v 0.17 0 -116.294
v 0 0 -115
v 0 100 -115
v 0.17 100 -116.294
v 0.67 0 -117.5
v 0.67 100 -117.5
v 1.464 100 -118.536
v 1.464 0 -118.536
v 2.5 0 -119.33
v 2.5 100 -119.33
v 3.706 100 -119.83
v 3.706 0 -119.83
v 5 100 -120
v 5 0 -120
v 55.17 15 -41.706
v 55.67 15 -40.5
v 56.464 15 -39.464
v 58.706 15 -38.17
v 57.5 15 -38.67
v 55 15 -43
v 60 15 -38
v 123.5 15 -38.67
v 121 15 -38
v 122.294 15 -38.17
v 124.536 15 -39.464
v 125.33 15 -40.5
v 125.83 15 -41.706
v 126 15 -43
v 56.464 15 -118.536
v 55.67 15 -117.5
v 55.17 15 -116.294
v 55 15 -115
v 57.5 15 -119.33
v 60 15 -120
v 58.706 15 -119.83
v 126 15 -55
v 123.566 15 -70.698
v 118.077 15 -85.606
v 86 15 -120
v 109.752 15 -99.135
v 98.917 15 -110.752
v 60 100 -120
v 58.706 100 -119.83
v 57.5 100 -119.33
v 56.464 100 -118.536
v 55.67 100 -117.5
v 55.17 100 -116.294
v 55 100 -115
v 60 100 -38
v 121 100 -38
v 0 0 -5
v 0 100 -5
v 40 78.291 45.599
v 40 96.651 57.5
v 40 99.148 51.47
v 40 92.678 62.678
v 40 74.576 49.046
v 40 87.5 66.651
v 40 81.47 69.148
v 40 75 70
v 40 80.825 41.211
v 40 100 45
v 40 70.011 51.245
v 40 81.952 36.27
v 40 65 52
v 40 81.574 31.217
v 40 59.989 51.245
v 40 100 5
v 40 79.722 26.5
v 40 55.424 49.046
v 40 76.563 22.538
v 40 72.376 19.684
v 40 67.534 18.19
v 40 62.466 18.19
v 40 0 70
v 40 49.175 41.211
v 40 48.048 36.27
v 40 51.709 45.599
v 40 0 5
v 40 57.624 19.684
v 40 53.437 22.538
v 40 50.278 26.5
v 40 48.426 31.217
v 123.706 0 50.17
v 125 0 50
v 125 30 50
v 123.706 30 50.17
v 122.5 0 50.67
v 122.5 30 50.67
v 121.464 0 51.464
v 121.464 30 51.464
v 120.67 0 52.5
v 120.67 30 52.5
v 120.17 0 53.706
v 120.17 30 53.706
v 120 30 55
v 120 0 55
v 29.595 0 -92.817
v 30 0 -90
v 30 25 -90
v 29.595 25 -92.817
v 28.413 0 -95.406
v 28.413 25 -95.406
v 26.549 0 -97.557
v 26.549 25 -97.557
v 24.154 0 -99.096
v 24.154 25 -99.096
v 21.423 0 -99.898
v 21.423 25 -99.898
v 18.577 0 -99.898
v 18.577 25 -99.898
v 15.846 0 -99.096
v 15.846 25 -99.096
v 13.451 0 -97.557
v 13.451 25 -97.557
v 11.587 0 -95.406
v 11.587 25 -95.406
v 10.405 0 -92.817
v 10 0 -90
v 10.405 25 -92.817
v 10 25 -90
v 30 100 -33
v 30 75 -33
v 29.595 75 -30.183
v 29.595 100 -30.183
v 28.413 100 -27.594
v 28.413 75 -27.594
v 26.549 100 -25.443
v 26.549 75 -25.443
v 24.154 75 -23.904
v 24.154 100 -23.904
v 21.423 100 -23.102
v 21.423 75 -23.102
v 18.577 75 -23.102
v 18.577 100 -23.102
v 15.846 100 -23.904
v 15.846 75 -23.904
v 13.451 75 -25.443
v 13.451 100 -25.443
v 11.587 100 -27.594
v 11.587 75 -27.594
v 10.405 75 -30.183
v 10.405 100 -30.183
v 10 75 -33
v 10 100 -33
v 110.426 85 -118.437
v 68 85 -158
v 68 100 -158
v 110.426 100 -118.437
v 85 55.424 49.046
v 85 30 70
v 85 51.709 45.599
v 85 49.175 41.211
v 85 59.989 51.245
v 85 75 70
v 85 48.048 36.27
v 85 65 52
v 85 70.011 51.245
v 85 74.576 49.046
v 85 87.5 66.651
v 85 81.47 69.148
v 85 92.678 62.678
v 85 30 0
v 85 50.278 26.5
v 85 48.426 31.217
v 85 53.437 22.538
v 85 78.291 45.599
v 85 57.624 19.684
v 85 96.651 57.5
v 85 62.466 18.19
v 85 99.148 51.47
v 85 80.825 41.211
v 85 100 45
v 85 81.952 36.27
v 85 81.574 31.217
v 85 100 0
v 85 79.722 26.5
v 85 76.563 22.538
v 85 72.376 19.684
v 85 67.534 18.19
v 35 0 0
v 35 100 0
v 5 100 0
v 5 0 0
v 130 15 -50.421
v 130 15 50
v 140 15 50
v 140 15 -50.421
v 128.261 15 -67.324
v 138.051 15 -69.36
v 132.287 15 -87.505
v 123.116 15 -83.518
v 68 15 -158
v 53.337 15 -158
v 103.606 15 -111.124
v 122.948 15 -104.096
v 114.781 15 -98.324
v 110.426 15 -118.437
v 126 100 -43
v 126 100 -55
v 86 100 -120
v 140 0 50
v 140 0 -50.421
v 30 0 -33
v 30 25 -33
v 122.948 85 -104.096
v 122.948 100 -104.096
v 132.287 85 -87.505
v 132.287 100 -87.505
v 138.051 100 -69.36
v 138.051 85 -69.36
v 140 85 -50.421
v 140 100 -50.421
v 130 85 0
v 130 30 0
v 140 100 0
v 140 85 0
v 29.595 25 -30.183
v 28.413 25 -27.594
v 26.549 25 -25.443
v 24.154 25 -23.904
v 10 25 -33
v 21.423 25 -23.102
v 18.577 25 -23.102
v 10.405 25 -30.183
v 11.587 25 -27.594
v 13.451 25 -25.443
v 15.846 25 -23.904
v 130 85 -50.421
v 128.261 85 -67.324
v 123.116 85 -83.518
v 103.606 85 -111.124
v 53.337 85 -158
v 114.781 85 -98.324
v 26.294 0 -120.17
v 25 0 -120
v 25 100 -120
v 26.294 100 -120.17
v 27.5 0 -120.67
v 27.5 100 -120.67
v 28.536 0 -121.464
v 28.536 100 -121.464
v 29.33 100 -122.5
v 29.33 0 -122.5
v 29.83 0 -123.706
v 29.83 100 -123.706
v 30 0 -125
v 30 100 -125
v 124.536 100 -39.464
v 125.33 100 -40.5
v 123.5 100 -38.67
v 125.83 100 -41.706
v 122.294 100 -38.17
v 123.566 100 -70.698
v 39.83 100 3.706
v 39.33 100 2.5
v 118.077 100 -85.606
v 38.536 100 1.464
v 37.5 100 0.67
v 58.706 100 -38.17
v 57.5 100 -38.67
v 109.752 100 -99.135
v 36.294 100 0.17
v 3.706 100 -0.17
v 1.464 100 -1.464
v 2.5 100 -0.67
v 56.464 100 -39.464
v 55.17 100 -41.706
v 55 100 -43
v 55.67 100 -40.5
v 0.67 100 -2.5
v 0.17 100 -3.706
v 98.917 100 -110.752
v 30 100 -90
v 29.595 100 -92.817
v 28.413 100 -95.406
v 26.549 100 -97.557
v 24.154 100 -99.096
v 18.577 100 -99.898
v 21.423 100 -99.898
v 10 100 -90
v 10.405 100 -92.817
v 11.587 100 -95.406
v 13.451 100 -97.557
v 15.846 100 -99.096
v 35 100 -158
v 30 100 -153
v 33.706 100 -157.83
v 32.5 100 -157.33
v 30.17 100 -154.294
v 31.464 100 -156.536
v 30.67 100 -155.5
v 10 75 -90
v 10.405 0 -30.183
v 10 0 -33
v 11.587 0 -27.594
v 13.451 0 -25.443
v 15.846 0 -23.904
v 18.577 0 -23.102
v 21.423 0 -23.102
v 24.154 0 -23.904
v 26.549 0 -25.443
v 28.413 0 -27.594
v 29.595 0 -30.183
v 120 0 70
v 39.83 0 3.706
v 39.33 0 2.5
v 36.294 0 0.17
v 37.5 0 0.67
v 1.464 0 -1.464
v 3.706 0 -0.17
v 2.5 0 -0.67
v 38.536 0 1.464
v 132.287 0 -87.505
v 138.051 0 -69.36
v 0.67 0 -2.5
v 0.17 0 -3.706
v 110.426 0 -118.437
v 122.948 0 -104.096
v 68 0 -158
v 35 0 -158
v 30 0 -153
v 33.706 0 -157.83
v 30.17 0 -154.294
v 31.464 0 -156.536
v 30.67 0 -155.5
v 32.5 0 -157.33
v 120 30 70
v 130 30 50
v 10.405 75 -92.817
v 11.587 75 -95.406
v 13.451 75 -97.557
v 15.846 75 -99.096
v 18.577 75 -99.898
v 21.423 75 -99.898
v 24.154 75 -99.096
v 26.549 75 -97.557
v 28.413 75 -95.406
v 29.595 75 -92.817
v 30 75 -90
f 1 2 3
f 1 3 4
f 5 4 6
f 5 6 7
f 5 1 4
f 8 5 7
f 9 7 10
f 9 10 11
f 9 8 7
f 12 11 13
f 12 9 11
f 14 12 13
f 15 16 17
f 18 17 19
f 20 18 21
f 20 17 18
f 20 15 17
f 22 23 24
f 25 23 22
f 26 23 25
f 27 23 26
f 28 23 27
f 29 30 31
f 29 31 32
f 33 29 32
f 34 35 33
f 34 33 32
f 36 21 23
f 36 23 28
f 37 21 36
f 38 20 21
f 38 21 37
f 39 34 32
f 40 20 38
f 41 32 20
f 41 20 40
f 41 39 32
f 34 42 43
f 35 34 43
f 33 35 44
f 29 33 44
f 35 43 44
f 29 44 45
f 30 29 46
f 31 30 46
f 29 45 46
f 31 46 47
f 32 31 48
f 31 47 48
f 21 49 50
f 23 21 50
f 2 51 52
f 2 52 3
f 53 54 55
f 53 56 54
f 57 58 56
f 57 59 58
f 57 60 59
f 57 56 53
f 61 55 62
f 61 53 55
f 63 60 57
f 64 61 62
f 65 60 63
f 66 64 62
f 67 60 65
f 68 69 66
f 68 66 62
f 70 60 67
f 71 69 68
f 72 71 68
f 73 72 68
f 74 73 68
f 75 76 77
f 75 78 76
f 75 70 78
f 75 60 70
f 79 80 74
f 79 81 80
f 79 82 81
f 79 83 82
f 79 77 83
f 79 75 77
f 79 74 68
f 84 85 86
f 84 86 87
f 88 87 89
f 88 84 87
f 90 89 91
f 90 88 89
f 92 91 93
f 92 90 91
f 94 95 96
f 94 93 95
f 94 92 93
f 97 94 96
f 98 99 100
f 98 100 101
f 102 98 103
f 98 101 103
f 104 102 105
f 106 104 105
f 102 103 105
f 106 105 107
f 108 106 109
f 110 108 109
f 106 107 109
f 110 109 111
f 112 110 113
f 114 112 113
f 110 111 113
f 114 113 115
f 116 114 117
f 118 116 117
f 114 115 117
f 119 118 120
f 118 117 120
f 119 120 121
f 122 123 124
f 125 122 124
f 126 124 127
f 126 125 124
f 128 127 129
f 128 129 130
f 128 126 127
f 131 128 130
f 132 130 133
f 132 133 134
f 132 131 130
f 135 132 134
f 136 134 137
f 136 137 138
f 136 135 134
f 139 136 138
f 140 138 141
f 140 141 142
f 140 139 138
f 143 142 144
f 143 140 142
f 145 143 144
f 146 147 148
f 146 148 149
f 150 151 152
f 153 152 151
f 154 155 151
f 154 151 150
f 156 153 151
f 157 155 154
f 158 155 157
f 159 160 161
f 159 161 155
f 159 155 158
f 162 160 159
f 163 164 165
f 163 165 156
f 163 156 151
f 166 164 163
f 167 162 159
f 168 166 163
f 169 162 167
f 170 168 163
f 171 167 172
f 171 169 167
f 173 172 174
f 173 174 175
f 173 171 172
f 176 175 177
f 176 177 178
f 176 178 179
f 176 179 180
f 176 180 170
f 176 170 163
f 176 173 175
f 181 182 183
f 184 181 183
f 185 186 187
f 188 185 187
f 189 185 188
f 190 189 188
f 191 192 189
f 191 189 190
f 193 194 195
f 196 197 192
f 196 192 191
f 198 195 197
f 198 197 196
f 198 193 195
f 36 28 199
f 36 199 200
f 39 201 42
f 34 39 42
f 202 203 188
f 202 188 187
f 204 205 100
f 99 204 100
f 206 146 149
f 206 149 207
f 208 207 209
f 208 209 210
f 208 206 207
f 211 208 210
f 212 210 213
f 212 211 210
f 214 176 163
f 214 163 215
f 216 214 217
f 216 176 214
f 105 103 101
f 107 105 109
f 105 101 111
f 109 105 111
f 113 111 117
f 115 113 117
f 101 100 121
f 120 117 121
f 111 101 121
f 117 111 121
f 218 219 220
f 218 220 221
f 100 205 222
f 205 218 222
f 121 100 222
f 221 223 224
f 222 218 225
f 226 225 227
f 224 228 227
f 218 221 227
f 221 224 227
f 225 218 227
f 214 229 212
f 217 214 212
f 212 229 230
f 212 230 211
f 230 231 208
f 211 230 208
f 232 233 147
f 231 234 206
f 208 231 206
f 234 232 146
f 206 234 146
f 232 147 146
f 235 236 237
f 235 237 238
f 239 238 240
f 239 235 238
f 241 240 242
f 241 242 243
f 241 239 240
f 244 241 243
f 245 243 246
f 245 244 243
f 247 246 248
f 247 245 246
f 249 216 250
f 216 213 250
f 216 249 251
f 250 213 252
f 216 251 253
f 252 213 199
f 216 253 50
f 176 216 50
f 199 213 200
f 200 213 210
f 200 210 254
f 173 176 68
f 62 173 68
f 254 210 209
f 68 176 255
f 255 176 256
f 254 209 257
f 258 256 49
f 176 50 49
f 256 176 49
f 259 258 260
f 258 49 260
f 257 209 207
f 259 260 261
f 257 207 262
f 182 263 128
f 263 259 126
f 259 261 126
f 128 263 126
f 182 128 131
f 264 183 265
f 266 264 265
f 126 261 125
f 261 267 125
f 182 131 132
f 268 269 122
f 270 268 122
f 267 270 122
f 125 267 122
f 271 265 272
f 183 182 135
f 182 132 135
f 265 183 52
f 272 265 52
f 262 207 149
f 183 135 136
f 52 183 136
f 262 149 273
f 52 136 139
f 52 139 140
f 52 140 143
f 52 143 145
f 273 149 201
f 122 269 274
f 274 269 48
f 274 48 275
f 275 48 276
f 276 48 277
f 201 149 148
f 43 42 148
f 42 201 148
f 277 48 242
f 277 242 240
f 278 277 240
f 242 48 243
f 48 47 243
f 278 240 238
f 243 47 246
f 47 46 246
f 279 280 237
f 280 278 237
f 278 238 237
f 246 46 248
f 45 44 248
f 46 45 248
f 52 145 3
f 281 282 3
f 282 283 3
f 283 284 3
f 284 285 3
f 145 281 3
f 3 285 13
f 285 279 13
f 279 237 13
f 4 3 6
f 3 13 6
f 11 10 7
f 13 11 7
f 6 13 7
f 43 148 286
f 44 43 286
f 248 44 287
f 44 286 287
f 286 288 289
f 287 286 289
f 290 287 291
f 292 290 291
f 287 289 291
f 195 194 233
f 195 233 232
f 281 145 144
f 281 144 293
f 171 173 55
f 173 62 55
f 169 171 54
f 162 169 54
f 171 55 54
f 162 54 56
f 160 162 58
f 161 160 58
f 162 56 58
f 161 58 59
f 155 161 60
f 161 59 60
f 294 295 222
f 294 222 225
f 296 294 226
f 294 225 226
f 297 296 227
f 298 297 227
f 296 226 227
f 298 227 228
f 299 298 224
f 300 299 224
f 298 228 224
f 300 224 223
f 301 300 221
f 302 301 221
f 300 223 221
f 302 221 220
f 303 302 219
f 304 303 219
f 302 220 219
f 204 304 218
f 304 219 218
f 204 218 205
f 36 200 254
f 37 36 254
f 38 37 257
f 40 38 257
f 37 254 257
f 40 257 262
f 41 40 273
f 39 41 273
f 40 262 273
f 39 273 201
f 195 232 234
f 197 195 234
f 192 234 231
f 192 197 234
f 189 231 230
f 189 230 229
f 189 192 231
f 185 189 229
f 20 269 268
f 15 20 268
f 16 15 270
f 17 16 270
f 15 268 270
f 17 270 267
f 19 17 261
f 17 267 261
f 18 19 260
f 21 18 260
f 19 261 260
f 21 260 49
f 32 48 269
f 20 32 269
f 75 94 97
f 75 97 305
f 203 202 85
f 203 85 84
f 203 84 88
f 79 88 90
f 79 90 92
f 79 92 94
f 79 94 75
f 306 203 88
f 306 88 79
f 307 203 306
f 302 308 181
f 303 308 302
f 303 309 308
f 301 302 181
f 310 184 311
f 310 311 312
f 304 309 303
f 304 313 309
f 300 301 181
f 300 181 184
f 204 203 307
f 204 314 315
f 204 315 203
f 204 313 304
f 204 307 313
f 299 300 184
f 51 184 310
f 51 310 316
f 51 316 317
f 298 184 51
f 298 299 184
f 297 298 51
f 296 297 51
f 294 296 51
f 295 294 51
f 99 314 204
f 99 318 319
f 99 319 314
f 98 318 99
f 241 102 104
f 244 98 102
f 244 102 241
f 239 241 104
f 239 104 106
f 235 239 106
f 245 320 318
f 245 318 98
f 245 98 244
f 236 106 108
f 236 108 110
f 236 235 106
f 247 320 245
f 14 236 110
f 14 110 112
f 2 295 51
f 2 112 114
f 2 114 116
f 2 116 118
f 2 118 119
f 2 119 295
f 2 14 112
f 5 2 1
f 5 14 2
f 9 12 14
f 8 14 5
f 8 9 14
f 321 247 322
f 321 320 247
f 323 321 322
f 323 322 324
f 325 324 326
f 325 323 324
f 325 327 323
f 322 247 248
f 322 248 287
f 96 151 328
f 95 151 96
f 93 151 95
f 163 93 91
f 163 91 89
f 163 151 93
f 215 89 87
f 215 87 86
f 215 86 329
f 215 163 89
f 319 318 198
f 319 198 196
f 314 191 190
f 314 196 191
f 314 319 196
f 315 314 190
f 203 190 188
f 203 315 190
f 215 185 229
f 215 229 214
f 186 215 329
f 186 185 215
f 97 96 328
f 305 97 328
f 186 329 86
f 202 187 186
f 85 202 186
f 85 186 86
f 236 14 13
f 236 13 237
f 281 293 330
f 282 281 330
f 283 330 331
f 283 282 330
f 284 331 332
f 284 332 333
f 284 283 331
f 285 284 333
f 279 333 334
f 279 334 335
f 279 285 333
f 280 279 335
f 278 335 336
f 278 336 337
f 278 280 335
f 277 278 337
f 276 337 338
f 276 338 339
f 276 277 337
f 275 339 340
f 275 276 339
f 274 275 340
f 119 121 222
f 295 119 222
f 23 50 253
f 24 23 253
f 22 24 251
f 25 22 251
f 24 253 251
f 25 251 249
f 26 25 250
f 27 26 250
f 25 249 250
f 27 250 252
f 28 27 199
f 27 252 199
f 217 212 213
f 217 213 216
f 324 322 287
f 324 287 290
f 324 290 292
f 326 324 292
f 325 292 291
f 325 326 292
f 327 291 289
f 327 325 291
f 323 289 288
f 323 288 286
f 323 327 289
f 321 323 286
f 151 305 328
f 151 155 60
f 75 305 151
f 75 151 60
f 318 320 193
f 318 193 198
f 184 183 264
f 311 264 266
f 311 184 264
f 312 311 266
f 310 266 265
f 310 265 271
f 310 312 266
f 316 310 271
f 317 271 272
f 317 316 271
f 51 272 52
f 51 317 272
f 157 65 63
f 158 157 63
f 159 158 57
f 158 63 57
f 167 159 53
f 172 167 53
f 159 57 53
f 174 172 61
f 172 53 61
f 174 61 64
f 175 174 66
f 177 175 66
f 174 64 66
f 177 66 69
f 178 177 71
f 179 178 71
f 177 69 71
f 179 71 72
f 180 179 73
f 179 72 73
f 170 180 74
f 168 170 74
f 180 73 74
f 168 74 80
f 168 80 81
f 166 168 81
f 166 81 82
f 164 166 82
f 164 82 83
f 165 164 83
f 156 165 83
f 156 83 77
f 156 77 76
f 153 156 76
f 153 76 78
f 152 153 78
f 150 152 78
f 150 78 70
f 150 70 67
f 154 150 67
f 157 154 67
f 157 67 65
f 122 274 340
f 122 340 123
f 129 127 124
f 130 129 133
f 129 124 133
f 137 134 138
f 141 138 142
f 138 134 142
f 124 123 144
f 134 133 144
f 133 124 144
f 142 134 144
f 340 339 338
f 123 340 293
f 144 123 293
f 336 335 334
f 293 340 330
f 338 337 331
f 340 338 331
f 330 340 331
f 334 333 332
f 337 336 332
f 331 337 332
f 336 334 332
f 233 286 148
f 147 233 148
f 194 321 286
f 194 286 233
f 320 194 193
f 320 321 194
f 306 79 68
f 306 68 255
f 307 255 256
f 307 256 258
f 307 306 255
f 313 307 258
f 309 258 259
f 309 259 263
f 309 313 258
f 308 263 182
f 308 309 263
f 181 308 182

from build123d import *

# Parameters (mm, degrees)
BOSS_EXTRUDE1_DEPTH = 100
CUT_EXTRUDE1_DEPTH  = 70
SKETCH3_W           = 55
SKETCH3_H           = 70
CUT_EXTRUDE2_DEPTH  = 70
FILLET1_R           = 25
CUT_EXTRUDE3_REACH  = 214.047
SKETCH4_R           = 17
CUT_EXTRUDE4_DEPTH  = 25
CUT_EXTRUDE5_START  = -25
CUT_EXTRUDE5_DEPTH  = 25
CUT_EXTRUDE6_DEPTH  = 85


with BuildPart() as part:
    # Sketch1 → Boss-Extrude1 (new body)
    with BuildSketch(Plane(origin=(0, 0, 0), x_dir=(1, 0, 0), z_dir=(0, 1, 0))):
        with BuildLine():
            Line((0, 5), (0, 115))
            ThreePointArc((0, 115), (1.464466094, 118.535533906), (5, 120))
            Line((5, 120), (25, 120))
            ThreePointArc((25, 120), (28.535533906, 121.464466094), (30, 125))
            Line((30, 125), (30, 153))
            ThreePointArc((30, 153), (31.464466094, 156.535533906), (35, 158))
            Line((35, 158), (68, 158))
            Line((68, 158), (110.425847486, 118.437257177))
            ThreePointArc((110.425847486, 118.437257177), (132.286586918, 87.505026337), (140, 50.421362927))
            Line((140, 50.421362927), (140, -50))
            Line((140, -50), (125, -50))
            ThreePointArc((125, -50), (121.464466094, -51.464466094), (120, -55))
            Line((120, -55), (120, -70))
            Line((120, -70), (40, -70))
            Line((40, -70), (40, -5))
            ThreePointArc((40, -5), (38.535533906, -1.464466094), (35, 0))
            Line((35, 0), (5, 0))
            ThreePointArc((5, 0), (1.464466094, 1.464466094), (0, 5))
        make_face()
    extrude(amount=BOSS_EXTRUDE1_DEPTH)

    # Sketch2 → Cut-Extrude1 (cut)
    with BuildSketch(Plane(origin=(0, 15, 0), x_dir=(-1, 0, 0), z_dir=(0, -1, 0))):
        with BuildLine():
            Line((-53.337208144, 158), (-103.605863885, 111.123720161))
            ThreePointArc((-103.605863885, 111.123720161), (-123.115986174, 83.517535648), (-130, 50.421362927))
            Line((-130, 50.421362927), (-130, -50))
            Line((-130, -50), (-140, -50))
            Line((-140, -50), (-140, 50.421362927))
            ThreePointArc((-140, 50.421362927), (-132.286586918, 87.505026337), (-110.425847486, 118.437257177))
            Line((-110.425847486, 118.437257177), (-68, 158))
            Line((-68, 158), (-53.337208144, 158))
        make_face()
    extrude(amount=-CUT_EXTRUDE1_DEPTH, mode=Mode.SUBTRACT)

    # Sketch3 → Cut-Extrude2 (cut)
    with BuildSketch(Plane(origin=(0, 100, 0), x_dir=(1, 0, 0), z_dir=(0, 1, 0))):
        with Locations((112.5, -35)):
            Rectangle(SKETCH3_W, SKETCH3_H)
    extrude(amount=-CUT_EXTRUDE2_DEPTH, mode=Mode.SUBTRACT)

    # Fillet1
    fillet1_edges = [part.edges().sort_by_distance(p)[0] for p in [
        (62.5, 100, 70),
    ]]
    fillet(fillet1_edges, radius=FILLET1_R)

    # Sketch4 → Cut-Extrude3 (cut, up to next)
    with BuildSketch(Plane.ZY.offset(-40), mode=Mode.PRIVATE) as cut_extrude3_sk1:
        with Locations((35, 65)):
            Circle(SKETCH4_R)
    cut_extrude3_tool1 = extrude(cut_extrude3_sk1.sketch, amount=-CUT_EXTRUDE3_REACH, mode=Mode.PRIVATE) & part.part
    add(cut_extrude3_tool1.solids().sort_by_distance((40, 65, 35))[0], mode=Mode.SUBTRACT)

    # Sketch5 → Cut-Extrude4 (cut)
    with BuildSketch(Plane(origin=(0, 100, 0), x_dir=(1, 0, 0), z_dir=(0, 1, 0))):
        with BuildLine():
            Line((30, 90), (30, 33))
            ThreePointArc((30, 33), (20, 23), (10, 33))
            Line((10, 33), (10, 90))
            ThreePointArc((10, 90), (20, 100), (30, 90))
        make_face()
    extrude(amount=-CUT_EXTRUDE4_DEPTH, mode=Mode.SUBTRACT)

    # Sketch6 → Cut-Extrude5 (cut)
    with BuildSketch(Plane.XZ.offset(CUT_EXTRUDE5_START)):
        with BuildLine():
            Line((30, -33), (30, -90))
            ThreePointArc((30, -90), (20, -100), (10, -90))
            Line((10, -90), (10, -33))
            ThreePointArc((10, -33), (20, -23), (30, -33))
        make_face()
    extrude(amount=CUT_EXTRUDE5_DEPTH, mode=Mode.SUBTRACT)

    # Sketch7 → Cut-Extrude6 (cut)
    with BuildSketch(Plane(origin=(0, 100, 0), x_dir=(1, 0, 0), z_dir=(0, 1, 0))):
        with BuildLine():
            Line((55, 115), (55, 43))
            ThreePointArc((55, 43), (56.464466094, 39.464466094), (60, 38))
            Line((60, 38), (121, 38))
            ThreePointArc((121, 38), (124.535533906, 39.464466094), (126, 43))
            Line((126, 43), (126, 55))
            ThreePointArc((126, 55), (114.251031375, 92.577557769), (86, 120))
            Line((86, 120), (60, 120))
            ThreePointArc((60, 120), (56.464466094, 118.535533906), (55, 115))
        make_face()
    extrude(amount=-CUT_EXTRUDE6_DEPTH, mode=Mode.SUBTRACT)


solid = part.part
